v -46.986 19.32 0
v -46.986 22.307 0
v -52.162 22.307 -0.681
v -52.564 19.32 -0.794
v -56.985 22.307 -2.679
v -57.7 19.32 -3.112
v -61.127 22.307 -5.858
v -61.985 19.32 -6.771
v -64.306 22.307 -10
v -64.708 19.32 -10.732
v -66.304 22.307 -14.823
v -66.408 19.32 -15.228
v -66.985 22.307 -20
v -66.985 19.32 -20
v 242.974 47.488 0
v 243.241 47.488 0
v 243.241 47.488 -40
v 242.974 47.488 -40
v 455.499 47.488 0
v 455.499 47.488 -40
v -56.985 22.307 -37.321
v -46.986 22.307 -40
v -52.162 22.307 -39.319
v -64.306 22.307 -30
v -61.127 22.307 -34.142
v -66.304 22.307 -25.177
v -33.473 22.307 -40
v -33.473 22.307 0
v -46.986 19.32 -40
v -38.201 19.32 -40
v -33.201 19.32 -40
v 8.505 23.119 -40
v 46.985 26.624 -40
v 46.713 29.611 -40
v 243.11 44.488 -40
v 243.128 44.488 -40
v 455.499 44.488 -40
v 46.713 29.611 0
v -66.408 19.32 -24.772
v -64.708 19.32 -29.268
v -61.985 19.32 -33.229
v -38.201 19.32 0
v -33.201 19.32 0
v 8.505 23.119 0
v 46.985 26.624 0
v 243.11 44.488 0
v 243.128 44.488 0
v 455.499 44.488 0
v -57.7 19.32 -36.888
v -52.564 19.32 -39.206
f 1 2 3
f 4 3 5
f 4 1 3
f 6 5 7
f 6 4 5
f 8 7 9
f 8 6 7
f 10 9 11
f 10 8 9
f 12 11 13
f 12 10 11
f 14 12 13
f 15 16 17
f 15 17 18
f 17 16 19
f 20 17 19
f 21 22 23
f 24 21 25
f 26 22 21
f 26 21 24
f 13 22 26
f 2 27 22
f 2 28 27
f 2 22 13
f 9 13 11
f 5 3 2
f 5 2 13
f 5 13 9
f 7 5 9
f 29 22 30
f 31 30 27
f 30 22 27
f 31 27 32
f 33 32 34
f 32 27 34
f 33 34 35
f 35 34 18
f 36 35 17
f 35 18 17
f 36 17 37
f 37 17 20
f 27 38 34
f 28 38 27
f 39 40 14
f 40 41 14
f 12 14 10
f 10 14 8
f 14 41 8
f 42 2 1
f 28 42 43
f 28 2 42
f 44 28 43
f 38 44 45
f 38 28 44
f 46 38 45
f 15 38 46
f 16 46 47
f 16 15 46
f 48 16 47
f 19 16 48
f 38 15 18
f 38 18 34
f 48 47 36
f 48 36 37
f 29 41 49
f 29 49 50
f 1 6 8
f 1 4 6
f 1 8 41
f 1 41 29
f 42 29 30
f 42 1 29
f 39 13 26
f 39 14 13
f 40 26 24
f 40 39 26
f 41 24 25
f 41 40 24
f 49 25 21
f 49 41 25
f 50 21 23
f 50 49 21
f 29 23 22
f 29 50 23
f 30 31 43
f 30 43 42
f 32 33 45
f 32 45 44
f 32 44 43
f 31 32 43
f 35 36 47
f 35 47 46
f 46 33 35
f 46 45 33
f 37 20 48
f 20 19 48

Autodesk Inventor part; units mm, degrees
ref_plane "YZ Plane" through (0, 0, 0) normal (1, 0, 0) x (0, 1, 0)
ref_plane "XZ Plane" through (0, 0, 0) normal (0, 1, 0) x (-1, 0, 0)
ref_plane "XY Plane" through (0, 0, 0) normal (0, 0, 1) x (1, 0, 0)
sketch "Szkic1" plane through (0, 0, 0) normal (0, 0, 1) x (1, 0, 0)
  line L0 (46.9852, 26.6235) -> (8.5048, 23.1186) projected
  line L1 (-61.9852, 19.3198) -> (-38.201, 19.3198) projected
  line L2 (-33.201, 19.3198) -> (-38.201, 19.3198) projected
  line L3 (-61.9852, 19.3198) -> (-66.9852, 19.3198) projected
  line L4 (46.9852, 26.6235) -> (-33.201, 19.3198)
  line L5 (46.9852, 26.6235) -> (243.11, 44.4876)
  line L6 (8.5048, 1) -> (16.799, 1) projected
  line L7 (8.5048, -1) -> (16.799, -1) projected
  line L8 (243.1277, 44.4876) -> (455.4993, 44.4876)
  line L9 (-66.9852, 19.3198) -> (-33.201, 19.3198)
  line L10 (243.2412, 47.4876) -> (455.4993, 47.4876)
  line L11 (242.9736, 47.4876) -> (46.713, 29.6112)
  line L12 (46.713, 29.6112) -> (-33.4732, 22.3074)
  line L13 (-33.4732, 22.3074) -> (-66.9852, 22.3074)
  line L14 (-66.9852, 22.3074) -> (-66.9852, 19.3198)
  line L15 (455.4993, 47.4876) -> (455.4993, 44.4876)
  line L16 (243.2412, 47.4876) -> (242.9736, 47.4876)
  line L17 (243.1277, 44.4876) -> (243.11, 44.4876)
  point P0 (0, 0)
  dimension "d1" = 3
  dimension "d2" = 3
extrude "Wyciągnięcie proste1" add sketch "Szkic1" against normal blind 40
fillet "Zaokrąglenie1" radius 20 2 edges at (-66.9852, 20.8136, 0) (-66.9852, 20.8136, -40)
properties part number "bok2"
